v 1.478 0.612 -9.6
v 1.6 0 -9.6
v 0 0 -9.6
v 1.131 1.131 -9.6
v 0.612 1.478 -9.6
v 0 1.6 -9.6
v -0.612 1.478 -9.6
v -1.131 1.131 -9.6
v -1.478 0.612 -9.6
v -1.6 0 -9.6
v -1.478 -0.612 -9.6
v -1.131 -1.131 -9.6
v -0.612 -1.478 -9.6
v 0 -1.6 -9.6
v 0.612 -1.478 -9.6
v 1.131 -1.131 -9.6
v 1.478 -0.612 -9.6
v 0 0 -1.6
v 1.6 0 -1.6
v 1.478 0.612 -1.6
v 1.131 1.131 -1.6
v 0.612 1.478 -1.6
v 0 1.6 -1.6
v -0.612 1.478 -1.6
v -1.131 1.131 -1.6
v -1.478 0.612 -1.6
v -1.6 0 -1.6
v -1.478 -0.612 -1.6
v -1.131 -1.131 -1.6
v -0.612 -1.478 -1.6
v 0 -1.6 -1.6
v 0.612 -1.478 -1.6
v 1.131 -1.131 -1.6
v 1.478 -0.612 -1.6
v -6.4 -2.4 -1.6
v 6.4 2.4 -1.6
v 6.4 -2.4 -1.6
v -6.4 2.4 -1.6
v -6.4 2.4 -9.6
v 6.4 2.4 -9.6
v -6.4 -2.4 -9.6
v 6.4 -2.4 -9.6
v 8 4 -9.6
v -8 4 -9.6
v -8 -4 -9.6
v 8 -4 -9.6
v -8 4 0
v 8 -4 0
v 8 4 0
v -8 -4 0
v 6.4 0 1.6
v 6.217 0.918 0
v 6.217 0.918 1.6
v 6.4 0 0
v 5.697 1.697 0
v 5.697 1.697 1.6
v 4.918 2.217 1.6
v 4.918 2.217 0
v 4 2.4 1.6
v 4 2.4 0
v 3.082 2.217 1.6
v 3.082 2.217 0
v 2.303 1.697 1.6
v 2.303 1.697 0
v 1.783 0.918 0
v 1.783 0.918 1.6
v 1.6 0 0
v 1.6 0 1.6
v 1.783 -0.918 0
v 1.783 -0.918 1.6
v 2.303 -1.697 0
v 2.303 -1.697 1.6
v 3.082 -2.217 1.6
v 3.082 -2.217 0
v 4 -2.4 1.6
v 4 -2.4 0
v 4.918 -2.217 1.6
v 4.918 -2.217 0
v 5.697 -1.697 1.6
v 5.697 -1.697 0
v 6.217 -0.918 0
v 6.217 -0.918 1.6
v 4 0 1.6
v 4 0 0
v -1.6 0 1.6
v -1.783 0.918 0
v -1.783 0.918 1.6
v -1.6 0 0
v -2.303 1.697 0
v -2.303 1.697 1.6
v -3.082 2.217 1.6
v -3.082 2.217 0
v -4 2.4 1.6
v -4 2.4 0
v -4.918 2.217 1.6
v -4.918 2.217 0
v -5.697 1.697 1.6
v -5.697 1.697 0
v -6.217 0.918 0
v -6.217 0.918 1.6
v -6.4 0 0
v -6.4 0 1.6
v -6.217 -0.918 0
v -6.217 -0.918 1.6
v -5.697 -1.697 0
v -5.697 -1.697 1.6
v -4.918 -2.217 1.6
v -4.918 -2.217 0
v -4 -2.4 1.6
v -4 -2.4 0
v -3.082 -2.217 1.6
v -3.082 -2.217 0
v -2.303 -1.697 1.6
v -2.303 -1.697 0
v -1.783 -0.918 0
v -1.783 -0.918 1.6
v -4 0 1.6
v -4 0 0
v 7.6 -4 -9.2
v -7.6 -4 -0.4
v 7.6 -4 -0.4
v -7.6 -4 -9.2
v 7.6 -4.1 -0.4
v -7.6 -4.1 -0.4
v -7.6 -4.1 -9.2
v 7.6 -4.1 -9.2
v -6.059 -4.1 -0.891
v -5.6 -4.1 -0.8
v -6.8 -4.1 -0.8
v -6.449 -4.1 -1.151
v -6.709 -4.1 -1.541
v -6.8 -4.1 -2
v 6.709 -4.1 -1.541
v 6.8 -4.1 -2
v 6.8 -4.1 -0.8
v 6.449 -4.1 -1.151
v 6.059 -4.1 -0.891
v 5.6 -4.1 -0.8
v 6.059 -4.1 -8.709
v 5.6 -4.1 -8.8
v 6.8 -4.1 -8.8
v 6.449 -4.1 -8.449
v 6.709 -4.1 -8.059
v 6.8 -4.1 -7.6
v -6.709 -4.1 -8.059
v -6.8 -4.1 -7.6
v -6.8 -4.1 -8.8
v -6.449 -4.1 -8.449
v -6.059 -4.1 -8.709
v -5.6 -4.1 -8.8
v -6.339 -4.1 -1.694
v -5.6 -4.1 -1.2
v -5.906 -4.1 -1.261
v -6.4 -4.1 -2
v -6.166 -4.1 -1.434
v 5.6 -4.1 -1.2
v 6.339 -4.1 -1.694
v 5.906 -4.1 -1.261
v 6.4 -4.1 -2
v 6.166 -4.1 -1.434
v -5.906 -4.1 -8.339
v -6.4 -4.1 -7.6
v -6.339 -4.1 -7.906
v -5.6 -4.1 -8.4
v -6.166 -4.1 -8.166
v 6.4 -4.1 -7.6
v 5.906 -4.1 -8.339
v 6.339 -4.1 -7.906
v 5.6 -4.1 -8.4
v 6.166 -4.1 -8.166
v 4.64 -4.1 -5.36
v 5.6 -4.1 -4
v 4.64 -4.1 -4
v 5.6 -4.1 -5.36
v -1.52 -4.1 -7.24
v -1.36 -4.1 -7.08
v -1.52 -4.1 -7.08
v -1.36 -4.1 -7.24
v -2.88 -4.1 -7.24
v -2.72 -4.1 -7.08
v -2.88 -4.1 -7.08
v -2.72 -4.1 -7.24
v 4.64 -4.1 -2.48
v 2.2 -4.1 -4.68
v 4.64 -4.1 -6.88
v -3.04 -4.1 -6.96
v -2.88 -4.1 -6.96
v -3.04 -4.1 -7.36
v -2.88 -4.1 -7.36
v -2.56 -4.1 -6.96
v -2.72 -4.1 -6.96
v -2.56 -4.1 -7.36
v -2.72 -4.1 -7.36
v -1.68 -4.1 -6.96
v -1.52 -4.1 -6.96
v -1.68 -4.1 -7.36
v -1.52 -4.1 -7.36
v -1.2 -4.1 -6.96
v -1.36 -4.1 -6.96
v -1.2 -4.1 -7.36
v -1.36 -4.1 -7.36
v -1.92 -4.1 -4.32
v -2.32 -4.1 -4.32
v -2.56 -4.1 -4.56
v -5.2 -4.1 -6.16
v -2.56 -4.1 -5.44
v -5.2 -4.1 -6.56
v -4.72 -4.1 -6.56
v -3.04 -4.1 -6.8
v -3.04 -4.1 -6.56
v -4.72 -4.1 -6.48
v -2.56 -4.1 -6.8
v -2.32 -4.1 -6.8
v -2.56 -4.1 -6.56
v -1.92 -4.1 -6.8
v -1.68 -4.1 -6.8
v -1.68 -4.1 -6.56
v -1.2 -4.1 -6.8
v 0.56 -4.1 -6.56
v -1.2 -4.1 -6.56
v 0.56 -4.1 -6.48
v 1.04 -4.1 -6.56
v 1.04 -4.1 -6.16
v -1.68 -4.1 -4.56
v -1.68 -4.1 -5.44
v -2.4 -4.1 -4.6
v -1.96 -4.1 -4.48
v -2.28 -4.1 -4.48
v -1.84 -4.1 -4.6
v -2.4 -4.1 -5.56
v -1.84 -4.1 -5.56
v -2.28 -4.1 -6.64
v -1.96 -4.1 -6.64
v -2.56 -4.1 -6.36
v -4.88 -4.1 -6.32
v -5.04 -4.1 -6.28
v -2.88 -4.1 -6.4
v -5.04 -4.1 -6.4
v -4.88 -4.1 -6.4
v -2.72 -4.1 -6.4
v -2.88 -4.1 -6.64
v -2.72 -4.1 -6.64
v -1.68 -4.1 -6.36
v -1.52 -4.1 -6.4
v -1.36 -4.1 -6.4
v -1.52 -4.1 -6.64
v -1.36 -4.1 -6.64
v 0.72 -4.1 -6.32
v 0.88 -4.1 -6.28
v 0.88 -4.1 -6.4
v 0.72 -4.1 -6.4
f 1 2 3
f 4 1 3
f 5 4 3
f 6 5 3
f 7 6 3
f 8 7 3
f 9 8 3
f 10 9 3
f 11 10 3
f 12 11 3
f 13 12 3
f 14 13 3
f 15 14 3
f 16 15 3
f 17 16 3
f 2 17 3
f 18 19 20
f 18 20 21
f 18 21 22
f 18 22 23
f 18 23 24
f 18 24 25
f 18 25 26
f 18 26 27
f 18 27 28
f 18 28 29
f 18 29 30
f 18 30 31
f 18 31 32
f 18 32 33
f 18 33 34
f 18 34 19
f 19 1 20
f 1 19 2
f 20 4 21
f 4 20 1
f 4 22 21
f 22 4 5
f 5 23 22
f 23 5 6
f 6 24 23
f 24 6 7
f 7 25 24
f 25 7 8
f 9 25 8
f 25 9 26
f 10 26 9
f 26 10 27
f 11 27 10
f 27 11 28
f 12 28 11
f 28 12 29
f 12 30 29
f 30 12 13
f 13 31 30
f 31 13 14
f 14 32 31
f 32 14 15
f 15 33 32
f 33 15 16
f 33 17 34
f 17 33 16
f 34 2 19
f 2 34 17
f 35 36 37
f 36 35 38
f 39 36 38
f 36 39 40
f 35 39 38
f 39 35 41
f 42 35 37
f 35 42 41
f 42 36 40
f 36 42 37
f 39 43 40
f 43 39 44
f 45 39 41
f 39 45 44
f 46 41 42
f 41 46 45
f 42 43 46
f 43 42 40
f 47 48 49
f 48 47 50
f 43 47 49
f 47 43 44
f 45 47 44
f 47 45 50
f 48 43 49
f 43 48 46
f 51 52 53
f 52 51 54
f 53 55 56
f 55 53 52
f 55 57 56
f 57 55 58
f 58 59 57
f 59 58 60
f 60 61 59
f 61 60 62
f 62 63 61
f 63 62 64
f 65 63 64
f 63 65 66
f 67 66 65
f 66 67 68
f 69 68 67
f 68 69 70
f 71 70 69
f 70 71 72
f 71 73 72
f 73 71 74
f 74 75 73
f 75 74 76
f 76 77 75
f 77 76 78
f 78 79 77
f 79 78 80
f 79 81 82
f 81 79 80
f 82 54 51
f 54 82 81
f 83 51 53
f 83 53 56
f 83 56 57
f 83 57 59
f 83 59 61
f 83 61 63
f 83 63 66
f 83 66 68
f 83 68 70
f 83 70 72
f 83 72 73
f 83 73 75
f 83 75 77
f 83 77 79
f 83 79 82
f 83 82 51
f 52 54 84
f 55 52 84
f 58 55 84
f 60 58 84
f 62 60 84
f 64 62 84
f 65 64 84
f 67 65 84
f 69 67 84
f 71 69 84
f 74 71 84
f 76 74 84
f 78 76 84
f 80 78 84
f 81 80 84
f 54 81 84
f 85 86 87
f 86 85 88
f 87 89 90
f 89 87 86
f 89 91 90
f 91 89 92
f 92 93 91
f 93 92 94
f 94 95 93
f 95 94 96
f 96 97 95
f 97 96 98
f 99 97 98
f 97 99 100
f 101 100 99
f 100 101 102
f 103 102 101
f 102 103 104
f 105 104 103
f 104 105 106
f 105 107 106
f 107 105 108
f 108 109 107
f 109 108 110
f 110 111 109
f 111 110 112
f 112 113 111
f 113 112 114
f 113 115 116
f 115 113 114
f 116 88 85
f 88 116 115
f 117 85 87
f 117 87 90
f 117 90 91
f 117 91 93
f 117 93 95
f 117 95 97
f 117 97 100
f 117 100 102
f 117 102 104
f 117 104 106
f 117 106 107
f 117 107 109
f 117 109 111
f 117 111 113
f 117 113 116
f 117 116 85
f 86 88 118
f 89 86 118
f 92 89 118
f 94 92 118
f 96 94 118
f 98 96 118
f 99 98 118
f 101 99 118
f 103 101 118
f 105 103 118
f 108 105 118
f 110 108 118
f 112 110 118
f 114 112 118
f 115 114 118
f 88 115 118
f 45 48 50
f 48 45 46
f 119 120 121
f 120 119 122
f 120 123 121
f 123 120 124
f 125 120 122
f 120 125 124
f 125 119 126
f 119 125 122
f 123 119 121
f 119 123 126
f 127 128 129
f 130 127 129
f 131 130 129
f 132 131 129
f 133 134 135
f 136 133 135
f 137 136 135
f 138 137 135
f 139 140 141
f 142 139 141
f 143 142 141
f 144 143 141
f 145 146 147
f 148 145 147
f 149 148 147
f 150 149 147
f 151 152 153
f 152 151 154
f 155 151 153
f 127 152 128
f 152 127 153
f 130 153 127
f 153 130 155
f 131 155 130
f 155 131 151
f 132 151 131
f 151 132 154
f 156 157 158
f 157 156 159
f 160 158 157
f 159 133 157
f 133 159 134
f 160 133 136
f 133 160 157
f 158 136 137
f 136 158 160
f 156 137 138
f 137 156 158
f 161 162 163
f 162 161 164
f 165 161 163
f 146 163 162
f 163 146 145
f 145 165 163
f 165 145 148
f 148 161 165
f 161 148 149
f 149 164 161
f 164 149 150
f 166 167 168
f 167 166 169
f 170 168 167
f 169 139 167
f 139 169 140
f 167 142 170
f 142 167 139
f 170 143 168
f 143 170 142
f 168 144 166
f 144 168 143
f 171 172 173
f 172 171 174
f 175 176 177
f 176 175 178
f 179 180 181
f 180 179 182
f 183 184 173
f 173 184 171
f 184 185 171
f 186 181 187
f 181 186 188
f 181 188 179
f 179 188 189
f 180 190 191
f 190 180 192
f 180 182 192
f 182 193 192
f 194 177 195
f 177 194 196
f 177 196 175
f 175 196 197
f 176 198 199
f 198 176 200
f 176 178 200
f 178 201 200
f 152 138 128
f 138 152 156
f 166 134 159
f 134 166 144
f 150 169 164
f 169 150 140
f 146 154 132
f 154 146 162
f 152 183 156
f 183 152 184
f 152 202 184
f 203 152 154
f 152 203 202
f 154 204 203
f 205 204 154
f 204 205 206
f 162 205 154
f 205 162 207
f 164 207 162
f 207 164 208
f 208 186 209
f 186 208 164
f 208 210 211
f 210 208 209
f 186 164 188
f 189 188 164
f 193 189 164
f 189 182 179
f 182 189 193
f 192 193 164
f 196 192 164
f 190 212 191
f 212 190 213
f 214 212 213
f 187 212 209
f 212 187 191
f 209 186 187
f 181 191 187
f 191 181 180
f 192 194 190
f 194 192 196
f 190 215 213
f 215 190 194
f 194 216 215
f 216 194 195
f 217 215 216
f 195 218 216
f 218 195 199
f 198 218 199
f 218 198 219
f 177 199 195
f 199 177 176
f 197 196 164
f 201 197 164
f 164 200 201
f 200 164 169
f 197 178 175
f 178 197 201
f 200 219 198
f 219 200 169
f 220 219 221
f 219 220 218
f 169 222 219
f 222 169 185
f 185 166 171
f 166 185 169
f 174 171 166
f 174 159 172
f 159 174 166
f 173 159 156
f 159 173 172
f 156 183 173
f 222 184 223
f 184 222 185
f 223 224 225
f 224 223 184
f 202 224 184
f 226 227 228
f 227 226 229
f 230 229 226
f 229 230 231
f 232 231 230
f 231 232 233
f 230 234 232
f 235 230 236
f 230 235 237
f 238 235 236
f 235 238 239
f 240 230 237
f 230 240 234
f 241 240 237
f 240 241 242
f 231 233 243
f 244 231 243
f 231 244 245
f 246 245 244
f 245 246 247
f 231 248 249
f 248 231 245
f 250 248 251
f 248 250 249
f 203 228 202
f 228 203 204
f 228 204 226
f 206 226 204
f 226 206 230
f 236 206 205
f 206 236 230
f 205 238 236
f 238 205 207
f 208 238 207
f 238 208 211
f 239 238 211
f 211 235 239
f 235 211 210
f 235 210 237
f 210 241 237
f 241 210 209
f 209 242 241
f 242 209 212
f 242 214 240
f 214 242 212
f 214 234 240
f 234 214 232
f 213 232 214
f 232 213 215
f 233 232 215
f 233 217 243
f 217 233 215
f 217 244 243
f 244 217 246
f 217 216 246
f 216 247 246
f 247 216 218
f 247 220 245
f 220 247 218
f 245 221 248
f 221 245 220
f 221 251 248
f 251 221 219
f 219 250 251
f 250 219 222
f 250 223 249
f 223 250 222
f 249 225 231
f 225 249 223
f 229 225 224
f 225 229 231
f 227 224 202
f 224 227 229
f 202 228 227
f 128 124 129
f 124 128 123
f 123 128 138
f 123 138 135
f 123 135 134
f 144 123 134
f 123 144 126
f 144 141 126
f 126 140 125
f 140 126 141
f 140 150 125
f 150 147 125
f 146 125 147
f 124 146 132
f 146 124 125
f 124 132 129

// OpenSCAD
// file: ../p/4-4edge.scad
use <../lib.scad>
function ldraw_lib__4_4edge() = [
// 0 Circle 1.0
// 0 Name: 4-4edge.dat
// 0 Author: James Jessiman
// 0 !LDRAW_ORG Primitive UPDATE 2017-01
// 0 !LICENSE Licensed under CC BY 2.0 and CC BY 4.0 : see CAreadme.txt
// 
// 0 BFC CERTIFY CCW
  [0,"BFC","CERTIFY"],
  [0,"BFC","CCW"],
// 
// 0 !HISTORY 1998-12-15 [PTadmin] Official Update 1998-10
// 0 !HISTORY 2005-12-28 [PTadmin] Official Update 2005-01
// 0 !HISTORY 2007-06-24 [PTadmin] Header formatted for Contributor Agreement
// 0 !HISTORY 2008-07-01 [PTadmin] Official Update 2008-01
// 0 !HISTORY 2017-01-15 [Steffen] BFCed
// 0 !HISTORY 2017-12-30 [PTadmin] Official Update 2017-01
// 
// 
// 2 24 1 0 0 0.9239 0 0.3827
  [2,24,1,0,0,0.9239,0,0.3827],
// 2 24 0.9239 0 0.3827 0.7071 0 0.7071
  [2,24,0.9239,0,0.3827,0.7071,0,0.7071],
// 2 24 0.7071 0 0.7071 0.3827 0 0.9239
  [2,24,0.7071,0,0.7071,0.3827,0,0.9239],
// 2 24 0.3827 0 0.9239 0 0 1
  [2,24,0.3827,0,0.9239,0,0,1],
// 2 24 0 0 1 -0.3827 0 0.9239
  [2,24,0,0,1,-0.3827,0,0.9239],
// 2 24 -0.3827 0 0.9239 -0.7071 0 0.7071
  [2,24,-0.3827,0,0.9239,-0.7071,0,0.7071],
// 2 24 -0.7071 0 0.7071 -0.9239 0 0.3827
  [2,24,-0.7071,0,0.7071,-0.9239,0,0.3827],
// 2 24 -0.9239 0 0.3827 -1 0 -0
  [2,24,-0.9239,0,0.3827,-1,0,-0],
// 2 24 -1 0 -0 -0.9239 0 -0.3827
  [2,24,-1,0,-0,-0.9239,0,-0.3827],
// 2 24 -0.9239 0 -0.3827 -0.7071 0 -0.7071
  [2,24,-0.9239,0,-0.3827,-0.7071,0,-0.7071],
// 2 24 -0.7071 0 -0.7071 -0.3827 0 -0.9239
  [2,24,-0.7071,0,-0.7071,-0.3827,0,-0.9239],
// 2 24 -0.3827 0 -0.9239 0 0 -1
  [2,24,-0.3827,0,-0.9239,0,0,-1],
// 2 24 0 0 -1 0.3827 0 -0.9239
  [2,24,0,0,-1,0.3827,0,-0.9239],
// 2 24 0.3827 0 -0.9239 0.7071 0 -0.7071
  [2,24,0.3827,0,-0.9239,0.7071,0,-0.7071],
// 2 24 0.7071 0 -0.7071 0.9239 0 -0.3827
  [2,24,0.7071,0,-0.7071,0.9239,0,-0.3827],
// 2 24 0.9239 0 -0.3827 1 0 0
  [2,24,0.9239,0,-0.3827,1,0,0],
];
module ldraw_lib__4_4edge(step=0, col=false, unit=2/5, alt=false, line=0.2, solid=!$preview)
    makepoly(ldraw_lib__4_4edge(), step=step, col=col, unit=unit, alt=alt, line=line, solid=solid);
ldraw_lib__4_4edge(line=0.2);
// file: ../p/4-4disc.scad
use <../lib.scad>
function ldraw_lib__4_4disc() = [
// 0 Disc 1.0
// 0 Name: 4-4disc.dat
// 0 Author: James Jessiman
// 0 !LDRAW_ORG Primitive UPDATE 2002-02
// 0 !LICENSE Licensed under CC BY 2.0 and CC BY 4.0 : see CAreadme.txt
// 
// 0 BFC CERTIFY CCW
  [0,"BFC","CERTIFY"],
  [0,"BFC","CCW"],
// 
// 0 !HISTORY 1998-12-15 [PTadmin] Official Update 1998-10
// 0 !HISTORY 2002-03-23 [sbliss] Added BFC statement
// 0 !HISTORY 2002-04-25 [PTadmin] Official Update 2002-02
// 0 !HISTORY 2007-06-24 [PTadmin] Header formatted for Contributor Agreement
// 0 !HISTORY 2008-07-01 [PTadmin] Official Update 2008-01
// 
// 
// 3 16 0 0 0 1 0 0 0.9239 0 0.3827
  [3,16,0,0,0,1,0,0,0.9239,0,0.3827],
// 3 16 0 0 0 0.9239 0 0.3827 0.7071 0 0.7071
  [3,16,0,0,0,0.9239,0,0.3827,0.7071,0,0.7071],
// 3 16 0 0 0 0.7071 0 0.7071 0.3827 0 0.9239
  [3,16,0,0,0,0.7071,0,0.7071,0.3827,0,0.9239],
// 3 16 0 0 0 0.3827 0 0.9239 0 0 1
  [3,16,0,0,0,0.3827,0,0.9239,0,0,1],
// 3 16 0 0 0 0 0 1 -0.3827 0 0.9239
  [3,16,0,0,0,0,0,1,-0.3827,0,0.9239],
// 3 16 0 0 0 -0.3827 0 0.9239 -0.7071 0 0.7071
  [3,16,0,0,0,-0.3827,0,0.9239,-0.7071,0,0.7071],
// 3 16 0 0 0 -0.7071 0 0.7071 -0.9239 0 0.3827
  [3,16,0,0,0,-0.7071,0,0.7071,-0.9239,0,0.3827],
// 3 16 0 0 0 -0.9239 0 0.3827 -1 0 -0
  [3,16,0,0,0,-0.9239,0,0.3827,-1,0,-0],
// 3 16 0 0 0 -1 0 -0 -0.9239 0 -0.3827
  [3,16,0,0,0,-1,0,-0,-0.9239,0,-0.3827],
// 3 16 0 0 0 -0.9239 0 -0.3827 -0.7071 0 -0.7071
  [3,16,0,0,0,-0.9239,0,-0.3827,-0.7071,0,-0.7071],
// 3 16 0 0 0 -0.7071 0 -0.7071 -0.3827 0 -0.9239
  [3,16,0,0,0,-0.7071,0,-0.7071,-0.3827,0,-0.9239],
// 3 16 0 0 0 -0.3827 0 -0.9239 0 0 -1
  [3,16,0,0,0,-0.3827,0,-0.9239,0,0,-1],
// 3 16 0 0 0 0 0 -1 0.3827 0 -0.9239
  [3,16,0,0,0,0,0,-1,0.3827,0,-0.9239],
// 3 16 0 0 0 0.3827 0 -0.9239 0.7071 0 -0.7071
  [3,16,0,0,0,0.3827,0,-0.9239,0.7071,0,-0.7071],
// 3 16 0 0 0 0.7071 0 -0.7071 0.9239 0 -0.3827
  [3,16,0,0,0,0.7071,0,-0.7071,0.9239,0,-0.3827],
// 3 16 0 0 0 0.9239 0 -0.3827 1 0 0
  [3,16,0,0,0,0.9239,0,-0.3827,1,0,0],
// 0
];
module ldraw_lib__4_4disc(step=0, col=false, unit=2/5, alt=false, line=0.2, solid=!$preview)
    makepoly(ldraw_lib__4_4disc(), step=step, col=col, unit=unit, alt=alt, line=line, solid=solid);
ldraw_lib__4_4disc(line=0.2);
// file: ../p/4-4cyli.scad
use <../lib.scad>
$fa=1; $fs=0.2;
function ldraw_lib__4_4cyli(realsolid=false) = [
// 0 Cylinder 1.0
// 0 Name: 4-4cyli.dat
// 0 Author: James Jessiman
// 0 !LDRAW_ORG Primitive UPDATE 2005-01
// 0 !LICENSE Licensed under CC BY 2.0 and CC BY 4.0 : see CAreadme.txt
// 
// 0 BFC CERTIFY CCW
  [0,"BFC","CERTIFY"],
  [0,"BFC","CCW"],
// 
// 0 !HISTORY 1998-12-15 [PTadmin] Official Update 1998-10
// 0 !HISTORY 2002-03-23 [sbliss] Added BFC statement; merged headers from files in distributions LDraw 0.27 and Complete.
// 0 !HISTORY 2002-04-25 [PTadmin] Official Update 2002-02
// 0 !HISTORY 2004-12-14 [guyvivan] BFC CCW
// 0 !HISTORY 2005-12-28 [PTadmin] Official Update 2005-01
// 0 !HISTORY 2007-06-24 [PTadmin] Header formatted for Contributor Agreement
// 0 !HISTORY 2008-07-01 [PTadmin] Official Update 2008-01
// 
// 
// 4 16 1 1 0 0.9239 1 0.3827 0.9239 0 0.3827 1 0 0
  [4,16,1,1,0,0.9239,1,0.3827,0.9239,0,0.3827,1,0,0],
// 5 24 1 0 0 1 1 0 0.9239 0 0.3827 0.9239 0 -0.3827
  [5,24,1,0,0,1,1,0,0.9239,0,0.3827,0.9239,0,-0.3827],
// 4 16 0.9239 1 0.3827 0.7071 1 0.7071 0.7071 0 0.7071 0.9239 0 0.3827
  [4,16,0.9239,1,0.3827,0.7071,1,0.7071,0.7071,0,0.7071,0.9239,0,0.3827],
// 5 24 0.9239 0 0.3827 0.9239 1 0.3827 0.7071 0 0.7071 1 0 0
  [5,24,0.9239,0,0.3827,0.9239,1,0.3827,0.7071,0,0.7071,1,0,0],
// 4 16 0.7071 1 0.7071 0.3827 1 0.9239 0.3827 0 0.9239 0.7071 0 0.7071
  [4,16,0.7071,1,0.7071,0.3827,1,0.9239,0.3827,0,0.9239,0.7071,0,0.7071],
// 5 24 0.7071 0 0.7071 0.7071 1 0.7071 0.3827 0 0.9239 0.9239 0 0.3827
  [5,24,0.7071,0,0.7071,0.7071,1,0.7071,0.3827,0,0.9239,0.9239,0,0.3827],
// 4 16 0.3827 1 0.9239 0 1 1 0 0 1 0.3827 0 0.9239
  [4,16,0.3827,1,0.9239,0,1,1,0,0,1,0.3827,0,0.9239],
// 5 24 0.3827 0 0.9239 0.3827 1 0.9239 0 0 1 0.7071 0 0.7071
  [5,24,0.3827,0,0.9239,0.3827,1,0.9239,0,0,1,0.7071,0,0.7071],
// 4 16 0 1 1 -0.3827 1 0.9239 -0.3827 0 0.9239 0 0 1
  [4,16,0,1,1,-0.3827,1,0.9239,-0.3827,0,0.9239,0,0,1],
// 5 24 0 0 1 0 1 1 -0.3827 0 0.9239 0.3827 0 0.9239
  [5,24,0,0,1,0,1,1,-0.3827,0,0.9239,0.3827,0,0.9239],
// 4 16 -0.3827 1 0.9239 -0.7071 1 0.7071 -0.7071 0 0.7071 -0.3827 0 0.9239
  [4,16,-0.3827,1,0.9239,-0.7071,1,0.7071,-0.7071,0,0.7071,-0.3827,0,0.9239],
// 5 24 -0.3827 0 0.9239 -0.3827 1 0.9239 -0.7071 0 0.7071 0 0 1
  [5,24,-0.3827,0,0.9239,-0.3827,1,0.9239,-0.7071,0,0.7071,0,0,1],
// 4 16 -0.7071 1 0.7071 -0.9239 1 0.3827 -0.9239 0 0.3827 -0.7071 0 0.7071
  [4,16,-0.7071,1,0.7071,-0.9239,1,0.3827,-0.9239,0,0.3827,-0.7071,0,0.7071],
// 5 24 -0.7071 0 0.7071 -0.7071 1 0.7071 -0.9239 0 0.3827 -0.3827 0 0.9239
  [5,24,-0.7071,0,0.7071,-0.7071,1,0.7071,-0.9239,0,0.3827,-0.3827,0,0.9239],
// 4 16 -0.9239 1 0.3827 -1 1 0 -1 0 0 -0.9239 0 0.3827
  [4,16,-0.9239,1,0.3827,-1,1,0,-1,0,0,-0.9239,0,0.3827],
// 5 24 -0.9239 0 0.3827 -0.9239 1 0.3827 -1 0 0 -0.7071 0 0.7071
  [5,24,-0.9239,0,0.3827,-0.9239,1,0.3827,-1,0,0,-0.7071,0,0.7071],
// 4 16 -1 1 0 -0.9239 1 -0.3827 -0.9239 0 -0.3827 -1 0 0
  [4,16,-1,1,0,-0.9239,1,-0.3827,-0.9239,0,-0.3827,-1,0,0],
// 5 24 -1 0 0 -1 1 0 -0.9239 0 -0.3827 -0.9239 0 0.3827
  [5,24,-1,0,0,-1,1,0,-0.9239,0,-0.3827,-0.9239,0,0.3827],
// 4 16 -0.9239 1 -0.3827 -0.7071 1 -0.7071 -0.7071 0 -0.7071 -0.9239 0 -0.3827
  [4,16,-0.9239,1,-0.3827,-0.7071,1,-0.7071,-0.7071,0,-0.7071,-0.9239,0,-0.3827],
// 5 24 -0.9239 0 -0.3827 -0.9239 1 -0.3827 -0.7071 0 -0.7071 -1 0 0
  [5,24,-0.9239,0,-0.3827,-0.9239,1,-0.3827,-0.7071,0,-0.7071,-1,0,0],
// 4 16 -0.7071 1 -0.7071 -0.3827 1 -0.9239 -0.3827 0 -0.9239 -0.7071 0 -0.7071
  [4,16,-0.7071,1,-0.7071,-0.3827,1,-0.9239,-0.3827,0,-0.9239,-0.7071,0,-0.7071],
// 5 24 -0.7071 0 -0.7071 -0.7071 1 -0.7071 -0.3827 0 -0.9239 -0.9239 0 -0.3827
  [5,24,-0.7071,0,-0.7071,-0.7071,1,-0.7071,-0.3827,0,-0.9239,-0.9239,0,-0.3827],
// 4 16 -0.3827 1 -0.9239 0 1 -1 0 0 -1 -0.3827 0 -0.9239
  [4,16,-0.3827,1,-0.9239,0,1,-1,0,0,-1,-0.3827,0,-0.9239],
// 5 24 -0.3827 0 -0.9239 -0.3827 1 -0.9239 0 0 -1 -0.7071 0 -0.7071
  [5,24,-0.3827,0,-0.9239,-0.3827,1,-0.9239,0,0,-1,-0.7071,0,-0.7071],
// 4 16 0 1 -1 0.3827 1 -0.9239 0.3827 0 -0.9239 0 0 -1
  [4,16,0,1,-1,0.3827,1,-0.9239,0.3827,0,-0.9239,0,0,-1],
// 5 24 0 0 -1 0 1 -1 0.3827 0 -0.9239 -0.3827 0 -0.9239
  [5,24,0,0,-1,0,1,-1,0.3827,0,-0.9239,-0.3827,0,-0.9239],
// 4 16 0.3827 1 -0.9239 0.7071 1 -0.7071 0.7071 0 -0.7071 0.3827 0 -0.9239
  [4,16,0.3827,1,-0.9239,0.7071,1,-0.7071,0.7071,0,-0.7071,0.3827,0,-0.9239],
// 5 24 0.3827 0 -0.9239 0.3827 1 -0.9239 0.7071 0 -0.7071 0 0 -1
  [5,24,0.3827,0,-0.9239,0.3827,1,-0.9239,0.7071,0,-0.7071,0,0,-1],
// 4 16 0.7071 1 -0.7071 0.9239 1 -0.3827 0.9239 0 -0.3827 0.7071 0 -0.7071
  [4,16,0.7071,1,-0.7071,0.9239,1,-0.3827,0.9239,0,-0.3827,0.7071,0,-0.7071],
// 5 24 0.7071 0 -0.7071 0.7071 1 -0.7071 0.9239 0 -0.3827 0.3827 0 -0.9239
  [5,24,0.7071,0,-0.7071,0.7071,1,-0.7071,0.9239,0,-0.3827,0.3827,0,-0.9239],
// 4 16 0.9239 1 -0.3827 1 1 0 1 0 0 0.9239 0 -0.3827
  [4,16,0.9239,1,-0.3827,1,1,0,1,0,0,0.9239,0,-0.3827],
// 5 24 0.9239 0 -0.3827 0.9239 1 -0.3827 1 0 0 0.7071 0 -0.7071
  [5,24,0.9239,0,-0.3827,0.9239,1,-0.3827,1,0,0,0.7071,0,-0.7071],
// 0
];
module ldraw_lib__4_4cyli(step=0, col=false, unit=2/5, alt=false, line=0.2, solid=!$preview)
    makepoly(ldraw_lib__4_4cyli(solid), step=step, col=col, unit=unit, alt=alt, line=line, solid=solid);
ldraw_lib__4_4cyli(line=0.2);
// file: ../p/stud3.scad
use <../lib.scad>
use <4-4cyli.scad>
use <4-4disc.scad>
use <4-4edge.scad>
function ldraw_lib__stud3() = [
// 0 Stud Tube Solid
// 0 Name: stud3.dat
// 0 Author: James Jessiman
// 0 !LDRAW_ORG Primitive UPDATE 2012-01
// 0 !LICENSE Licensed under CC BY 4.0 : see CAreadme.txt
// 
// 0 BFC CERTIFY CCW
  [0,"BFC","CERTIFY"],
  [0,"BFC","CCW"],
// 
// 0 !HISTORY 2002-04-04 [sbliss] Modified for BFC compliance
// 0 !HISTORY 2002-04-25 [PTadmin] Official Update 2002-02
// 0 !HISTORY 2007-06-24 [PTadmin] Header formatted for Contributor Agreement
// 0 !HISTORY 2008-07-01 [PTadmin] Official Update 2008-01
// 0 !HISTORY 2012-02-16 [Philo] Changed to CCW
// 0 !HISTORY 2012-03-30 [PTadmin] Official Update 2012-01
// 
// 
// 1 16 0 -4 0 4 0 0 0 1 0 0 0 4 4-4edge.dat
  [1,16,0,-4,0,4,0,0,0,1,0,0,0,4, ldraw_lib__4_4edge()],
// 1 16 0 0 0 4 0 0 0 1 0 0 0 4 4-4edge.dat
  [1,16,0,0,0,4,0,0,0,1,0,0,0,4, ldraw_lib__4_4edge()],
// 1 16 0 -4 0 4 0 0 0 1 0 0 0 4 4-4disc.dat
  [1,16,0,-4,0,4,0,0,0,1,0,0,0,4, ldraw_lib__4_4disc()],
  [-1,16,0,0,0,4,0,0,0,-1,0,0,0,4, ldraw_lib__4_4disc()],
// 1 16 0 -4 0 4 0 0 0 4 0 0 0 4 4-4cyli.dat
  [1,16,0,-4,0,4,0,0,0,4,0,0,0,4, ldraw_lib__4_4cyli()],
];
module ldraw_lib__stud3(step=0, col=false, unit=2/5, alt=false, line=0.2, solid=!$preview)
    makepoly(ldraw_lib__stud3(), step=step, col=col, unit=unit, alt=alt, line=line, solid=solid);
ldraw_lib__stud3(line=0.2);
// file: ../p/stud.scad
use <../lib.scad>
use <4-4cyli.scad>
use <4-4disc.scad>
use <4-4edge.scad>
function ldraw_lib__stud() = [
// 0 Stud
// 0 Name: stud.dat
// 0 Author: James Jessiman
// 0 !LDRAW_ORG Primitive UPDATE 2012-01
// 0 !LICENSE Licensed under CC BY 4.0 : see CAreadme.txt
// 
// 0 BFC CERTIFY CCW
  [0,"BFC","CERTIFY"],
  [0,"BFC","CCW"],
// 
// 0 !HISTORY 2002-04-04 [sbliss] Modified for BFC compliance
// 0 !HISTORY 2002-04-25 [PTadmin] Official Update 2002-02
// 0 !HISTORY 2007-06-24 [PTadmin] Header formatted for Contributor Agreement
// 0 !HISTORY 2008-07-01 [PTadmin] Official Update 2008-01
// 0 !HISTORY 2012-02-16 [Philo] Changed to CCW
// 0 !HISTORY 2012-03-30 [PTadmin] Official Update 2012-01
// 
// 
// 1 16 0 0 0 6 0 0 0 1 0 0 0 6 4-4edge.dat
  [1,16,0,0,0,6,0,0,0,1,0,0,0,6, ldraw_lib__4_4edge()],
// 1 16 0 -4 0 6 0 0 0 1 0 0 0 6 4-4edge.dat
  [1,16,0,-4,0,6,0,0,0,1,0,0,0,6, ldraw_lib__4_4edge()],
// 1 16 0 0 0 6 0 0 0 -4 0 0 0 6 4-4cyli.dat
  [1,16,0,0,0,6,0,0,0,-4,0,0,0,6, ldraw_lib__4_4cyli()],
// 1 16 0 -4 0 6 0 0 0 1 0 0 0 6 4-4disc.dat
  [1,16,0,-4,0,6,0,0,0,1,0,0,0,6, ldraw_lib__4_4disc()],
  [-1,16,0,0,0,6,0,0,0,-1,0,0,0,6, ldraw_lib__4_4disc()],
];
module ldraw_lib__stud(step=0, col=false, unit=2/5, alt=false, line=0.2, solid=!$preview)
    makepoly(ldraw_lib__stud(), step=step, col=col, unit=unit, alt=alt, line=line, solid=solid);
ldraw_lib__stud(line=0.2);
// file: ../p/box5.scad
use <../lib.scad>
function ldraw_lib__box5() = [
// 0 Box with 5 Faces and All Edges
// 0 Name: box5.dat
// 0 Author: James Jessiman
// 0 !LDRAW_ORG Primitive UPDATE 2012-01
// 0 !LICENSE Licensed under CC BY 2.0 and CC BY 4.0 : see CAreadme.txt
// 
// 0 BFC CERTIFY CCW
  [0,"BFC","CERTIFY"],
  [0,"BFC","CCW"],
// 
// 0 !HISTORY 2002-04-03 [sbliss] Modified for BFC compliance
// 0 !HISTORY 2002-04-25 [PTadmin] Official Update 2002-02
// 0 !HISTORY 2007-06-24 [PTadmin] Header formatted for Contributor Agreement
// 0 !HISTORY 2008-07-01 [PTadmin] Official Update 2008-01
// 0 !HISTORY 2012-02-16 [Philo] Changed to CCW
// 0 !HISTORY 2012-03-30 [PTadmin] Official Update 2012-01
// 
// 
// 2 24 1 1 1 -1 1 1
  [2,24,1,1,1,-1,1,1],
// 2 24 -1 1 1 -1 1 -1
  [2,24,-1,1,1,-1,1,-1],
// 2 24 -1 1 -1 1 1 -1
  [2,24,-1,1,-1,1,1,-1],
// 2 24 1 1 -1 1 1 1
  [2,24,1,1,-1,1,1,1],
// 2 24 1 0 1 -1 0 1
  [2,24,1,0,1,-1,0,1],
// 2 24 -1 0 1 -1 0 -1
  [2,24,-1,0,1,-1,0,-1],
// 2 24 -1 0 -1 1 0 -1
  [2,24,-1,0,-1,1,0,-1],
// 2 24 1 0 -1 1 0 1
  [2,24,1,0,-1,1,0,1],
// 2 24 1 0 1 1 1 1
  [2,24,1,0,1,1,1,1],
// 2 24 -1 0 1 -1 1 1
  [2,24,-1,0,1,-1,1,1],
// 2 24 1 0 -1 1 1 -1
  [2,24,1,0,-1,1,1,-1],
// 2 24 -1 0 -1 -1 1 -1
  [2,24,-1,0,-1,-1,1,-1],
// 4 16 -1 1 1 1 1 1 1 1 -1 -1 1 -1
  [4,16,-1,1,1,1,1,1,1,1,-1,-1,1,-1],
// 4 16 -1 1 1 -1 0 1 1 0 1 1 1 1
  [4,16,-1,1,1,-1,0,1,1,0,1,1,1,1],
// 4 16 -1 1 -1 -1 0 -1 -1 0 1 -1 1 1
  [4,16,-1,1,-1,-1,0,-1,-1,0,1,-1,1,1],
// 4 16 1 1 -1 1 0 -1 -1 0 -1 -1 1 -1
  [4,16,1,1,-1,1,0,-1,-1,0,-1,-1,1,-1],
// 4 16 1 1 1 1 0 1 1 0 -1 1 1 -1
  [4,16,1,1,1,1,0,1,1,0,-1,1,1,-1],
];
makepoly(ldraw_lib__box5(), line=0.2);
// file: ../p/box4t.scad
use <../lib.scad>
function ldraw_lib__box4t() = [
// 0 Box with 4 Adjacent Faces and All Edges
// 0 Name: box4t.dat
// 0 Author: Tore Eriksson [Tore_Eriksson]
// 0 !LDRAW_ORG Primitive UPDATE 2003-02
// 0 !LICENSE Licensed under CC BY 2.0 and CC BY 4.0 : see CAreadme.txt
// 
// 0 BFC CERTIFY CCW
  [0,"BFC","CERTIFY"],
  [0,"BFC","CCW"],
// 
// 0 !HISTORY 1997-09-29 [PTadmin] Official Update 1997-15
// 0 !HISTORY 2002-08-31 [izanette] Modified with WINDZ for BFC compliance
// 0 !HISTORY 2003-08-01 [PTadmin] Official Update 2003-02
// 0 !HISTORY 2007-06-24 [PTadmin] Header formatted for Contributor Agreement
// 0 !HISTORY 2008-07-01 [PTadmin] Official Update 2008-01
// 
// 
// 2 24 1 1 1 -1 1 1
  [2,24,1,1,1,-1,1,1],
// 2 24 -1 1 1 -1 1 -1
  [2,24,-1,1,1,-1,1,-1],
// 2 24 -1 1 -1 1 1 -1
  [2,24,-1,1,-1,1,1,-1],
// 2 24 1 1 -1 1 1 1
  [2,24,1,1,-1,1,1,1],
// 2 24 1 0 1 -1 0 1
  [2,24,1,0,1,-1,0,1],
// 2 24 -1 0 1 -1 0 -1
  [2,24,-1,0,1,-1,0,-1],
// 2 24 -1 0 -1 1 0 -1
  [2,24,-1,0,-1,1,0,-1],
// 2 24 1 0 -1 1 0 1
  [2,24,1,0,-1,1,0,1],
// 2 24 1 0 1 1 1 1
  [2,24,1,0,1,1,1,1],
// 2 24 -1 0 1 -1 1 1
  [2,24,-1,0,1,-1,1,1],
// 2 24 1 0 -1 1 1 -1
  [2,24,1,0,-1,1,1,-1],
// 2 24 -1 0 -1 -1 1 -1
  [2,24,-1,0,-1,-1,1,-1],
// 4 16 1 1 1 1 1 -1 -1 1 -1 -1 1 1
  [4,16,1,1,1,1,1,-1,-1,1,-1,-1,1,1],
// 4 16 1 1 1 -1 1 1 -1 0 1 1 0 1
  [4,16,1,1,1,-1,1,1,-1,0,1,1,0,1],
// 4 16 -1 1 1 -1 1 -1 -1 0 -1 -1 0 1
  [4,16,-1,1,1,-1,1,-1,-1,0,-1,-1,0,1],
// 0 4 16 -1 1 -1 -1 0 -1 1 0 -1 1 1 -1
// 4 16 1 1 -1 1 1 1 1 0 1 1 0 -1
  [4,16,1,1,-1,1,1,1,1,0,1,1,0,-1],
// 0
];
makepoly(ldraw_lib__box4t(), line=0.2);
// file: s/3004s01.scad
use <../../lib.scad>
use <../../p/box4t.scad>
use <../../p/box5.scad>
use <../../p/stud.scad>
use <../../p/stud3.scad>
$fa=1; $fs=0.2;
function ldraw_lib__s__3004s01(realsolid=false) = [
// 0 ~Brick  1 x  2 without Front Face
// 0 Name: s\3004s01.dat
// 0 Author: James Jessiman
// 0 !LDRAW_ORG Subpart UPDATE 2003-03
// 0 !LICENSE Licensed under CC BY 2.0 and CC BY 4.0 : see CAreadme.txt
// 
// 0 BFC CERTIFY CCW
  [0,"BFC","CERTIFY"],
  [0,"BFC","CCW"],
// 
// 0 !HISTORY 2003-09-07 [jriley] Subfiling, BFC
// 0 !HISTORY 2003-12-19 [PTadmin] Official Update 2003-03
// 0 !HISTORY 2007-08-29 [PTadmin] Header formatted for Contributor Agreement
// 0 !HISTORY 2008-07-01 [PTadmin] Official Update 2008-01
// 
// 
// 1 16 0 4 0 1 0 0 0 -5 0 0 0 1 stud3.dat
  [1,16,0,4,0,1,0,0,0,-5,0,0,0,1, ldraw_lib__stud3(realsolid)],
// 0 BFC INVERTNEXT
  [0,"BFC","INVERTNEXT"],
// 1 16 0 24 0 16 0 0 0 -20 0 0 0 6 box5.dat
  [1,16,0,24,0,16,0,0,0,-20,0,0,0,6, ldraw_lib__box5(realsolid)],
// 4 16 20 24 10 16 24 6 -16 24 6 -20 24 10
  [4,16,20,24,10,16,24,6,-16,24,6,-20,24,10],
// 4 16 -20 24 10 -16 24 6 -16 24 -6 -20 24 -10
  [4,16,-20,24,10,-16,24,6,-16,24,-6,-20,24,-10],
// 4 16 -20 24 -10 -16 24 -6 16 24 -6 20 24 -10
  [4,16,-20,24,-10,-16,24,-6,16,24,-6,20,24,-10],
// 4 16 20 24 -10 16 24 -6 16 24 6 20 24 10
  [4,16,20,24,-10,16,24,-6,16,24,6,20,24,10],
// 1 16 0 24 0 20 0 0 0 -24 0 0 0 10 box4t.dat
  [1,16,0,24,0,20,0,0,0,-24,0,0,0,10, ldraw_lib__box4t(realsolid)],
// 1 16 10 0 0 1 0 0 0 1 0 0 0 1 stud.dat
  [1,16,10,0,0,1,0,0,0,1,0,0,0,1, ldraw_lib__stud(realsolid)],
// 1 16 -10 0 0 1 0 0 0 1 0 0 0 1 stud.dat
  [1,16,-10,0,0,1,0,0,0,1,0,0,0,1, ldraw_lib__stud(realsolid)],
// 0
];
module ldraw_lib__s__3004s01(step=0, col=false, unit=2/5, alt=false, line=0.2, solid=!$preview)
    makepoly(ldraw_lib__s__3004s01(solid), step=step, col=col, unit=unit, alt=alt, line=line, solid=solid);
ldraw_lib__s__3004s01(line=0.2);
// file: ../p/box5-12.scad
use <../lib.scad>
function ldraw_lib__box5_12() = [
// 0 Box with 5 Faces without Any Edges
// 0 Name: box5-12.dat
// 0 Author: Chris Dee [cwdee]
// 0 !LDRAW_ORG Primitive UPDATE 2009-02
// 0 !LICENSE Licensed under CC BY 2.0 and CC BY 4.0 : see CAreadme.txt
// 
// 0 BFC CERTIFY CCW
  [0,"BFC","CERTIFY"],
  [0,"BFC","CCW"],
// 
// 0 !HISTORY 2009-09-03 [PTadmin] Official Update 2009-02
// 
// 
// 4 16 1 1 1 1 1 -1 -1 1 -1 -1 1 1
  [4,16,1,1,1,1,1,-1,-1,1,-1,-1,1,1],
// 4 16 -1 0 1 1 0 1 1 1 1 -1 1 1
  [4,16,-1,0,1,1,0,1,1,1,1,-1,1,1],
// 4 16 -1 0 -1 -1 0 1 -1 1 1 -1 1 -1
  [4,16,-1,0,-1,-1,0,1,-1,1,1,-1,1,-1],
// 4 16 1 0 -1 -1 0 -1 -1 1 -1 1 1 -1
  [4,16,1,0,-1,-1,0,-1,-1,1,-1,1,1,-1],
// 4 16 1 0 1 1 0 -1 1 1 -1 1 1 1
  [4,16,1,0,1,1,0,-1,1,1,-1,1,1,1],
// 0
];
module ldraw_lib__box5_12(step=0, col=false, unit=2/5, alt=false, line=0.2, solid=!$preview)
    makepoly(ldraw_lib__box5_12(), step=step, col=col, unit=unit, alt=alt, line=line, solid=solid);
ldraw_lib__box5_12(line=0.2);
// file: ../p/1-4ring2.scad
use <../lib.scad>
$fa=1; $fs=0.2;
function ldraw_lib__1_4ring2(realsolid=false) = [
// 0 Ring  2 x 0.25
// 0 Name: 1-4ring2.dat
// 0 Author: Franklin W. Cain [fwcain]
// 0 !LDRAW_ORG Primitive UPDATE 2015-01
// 0 !LICENSE Licensed under CC BY 2.0 and CC BY 4.0 : see CAreadme.txt
// 
// 0 BFC CERTIFY CCW
  [0,"BFC","CERTIFY"],
  [0,"BFC","CCW"],
// 
// 0 !HISTORY 2001-12-31 [PTadmin] Official Update 2001-03
// 0 !HISTORY 2007-06-22 [PTadmin] Header formatted for Contributor Agreement
// 0 !HISTORY 2008-07-01 [PTadmin] Official Update 2008-01
// 0 !HISTORY 2012-02-16 [Philo] Changed to CCW
// 0 !HISTORY 2012-03-30 [PTadmin] Official Update 2012-01
// 0 !HISTORY 2014-12-25 [MMR1988] Fixed a rounding issue
// 0 !HISTORY 2015-10-11 [PTadmin] Official Update 2015-01
// 
// 
// 4 16 3 0 0 2.7717 0 1.1481 1.8478 0 0.7654 2 0 0
  [4,16,3,0,0,2.7717,0,1.1481,1.8478,0,0.7654,2,0,0],
// 4 16 2.7717 0 1.1481 2.1213 0 2.1213 1.4142 0 1.4142 1.8478 0 0.7654
  [4,16,2.7717,0,1.1481,2.1213,0,2.1213,1.4142,0,1.4142,1.8478,0,0.7654],
// 4 16 2.1213 0 2.1213 1.1481 0 2.7717 0.7654 0 1.8478 1.4142 0 1.4142
  [4,16,2.1213,0,2.1213,1.1481,0,2.7717,0.7654,0,1.8478,1.4142,0,1.4142],
// 4 16 1.1481 0 2.7717 0 0 3 0 0 2 0.7654 0 1.8478
  [4,16,1.1481,0,2.7717,0,0,3,0,0,2,0.7654,0,1.8478],
// 0 // Build by Primitive Generator 2
];
module ldraw_lib__1_4ring2(step=0, col=false, unit=2/5, alt=false, line=0.2, solid=!$preview)
    makepoly(ldraw_lib__1_4ring2(solid), step=step, col=col, unit=unit, alt=alt, line=line, solid=solid);
ldraw_lib__1_4ring2(line=0.2);
// file: ../p/1-4ndis.scad
use <../lib.scad>
function ldraw_lib__1_4ndis() = [
// 0 Disc Negative 0.25
// 0 Name: 1-4ndis.dat
// 0 Author: James Jessiman
// 0 !LDRAW_ORG Primitive UPDATE 2012-01
// 0 !LICENSE Licensed under CC BY 2.0 and CC BY 4.0 : see CAreadme.txt
// 
// 0 BFC CERTIFY CCW
  [0,"BFC","CERTIFY"],
  [0,"BFC","CCW"],
// 
// 0 !HISTORY 2002-03-23 [sbliss] Added BFC Statement
// 0 !HISTORY 2002-04-25 [PTadmin] Official Update 2002-02
// 0 !HISTORY 2007-06-22 [PTadmin] Header formatted for Contributor Agreement
// 0 !HISTORY 2008-07-01 [PTadmin] Official Update 2008-01
// 0 !HISTORY 2012-02-16 [Philo] Changed to CCW
// 0 !HISTORY 2012-03-30 [PTadmin] Official Update 2012-01
// 
// 
// 3 16 0.9239 0 0.3827 1 0 0 1 0 1
  [3,16,0.9239,0,0.3827,1,0,0,1,0,1],
// 3 16 0.7071 0 0.7071 0.9239 0 0.3827 1 0 1
  [3,16,0.7071,0,0.7071,0.9239,0,0.3827,1,0,1],
// 3 16 0.3827 0 0.9239 0.7071 0 0.7071 1 0 1
  [3,16,0.3827,0,0.9239,0.7071,0,0.7071,1,0,1],
// 3 16 0 0 1 0.3827 0 0.9239 1 0 1
  [3,16,0,0,1,0.3827,0,0.9239,1,0,1],
];
module ldraw_lib__1_4ndis(step=0, col=false, unit=2/5, alt=false, line=0.2, solid=!$preview)
    makepoly(ldraw_lib__1_4ndis(), step=step, col=col, unit=unit, alt=alt, line=line, solid=solid);
ldraw_lib__1_4ndis(line=0.2);
// file: ../p/1-4chrd.scad
use <../lib.scad>
$fa=1; $fs=0.2;
function ldraw_lib__1_4chrd(realsolid=false) = [
// 0 Chord 0.25
// 0 Name: 1-4chrd.dat
// 0 Author: Tony Hafner [hafhead]
// 0 !LDRAW_ORG Primitive UPDATE 2012-02
// 0 !LICENSE Licensed under CC BY 2.0 and CC BY 4.0 : see CAreadme.txt
// 
// 0 BFC CERTIFY CCW
  [0,"BFC","CERTIFY"],
  [0,"BFC","CCW"],
// 
// 0 !HISTORY 2004-04-22 [PTadmin] Official Update 2004-02
// 0 !HISTORY 2007-10-09 [PTadmin] Header formatted for Contributor Agreement
// 0 !HISTORY 2008-07-01 [PTadmin] Official Update 2008-01
// 0 !HISTORY 2012-08-02 [MMR1988] Re-creation with PrimGen2 and Rectifier
// 0 !HISTORY 2012-08-09 [PTadmin] Official Update 2012-02
// 
// 
// 4 16 0.9239 0 0.3827 0.3827 0 0.9239 0 0 1 1 0 0
  [4,16,0.9239,0,0.3827,0.3827,0,0.9239,0,0,1,1,0,0],
// 3 16 0.7071 0 0.7071 0.3827 0 0.9239 0.9239 0 0.3827
  [3,16,0.7071,0,0.7071,0.3827,0,0.9239,0.9239,0,0.3827],
];
module ldraw_lib__1_4chrd(step=0, col=false, unit=2/5, alt=false, line=0.2, solid=!$preview)
    makepoly(ldraw_lib__1_4chrd(solid), step=step, col=col, unit=unit, alt=alt, line=line, solid=solid);
ldraw_lib__1_4chrd(line=0.2);
// file: 3004.scad
use <../lib.scad>
use <s/3004s01.scad>
function ldraw_lib__3004() = [
// 0 Brick  1 x  2
// 0 Name: 3004.dat
// 0 Author: James Jessiman
// 0 !LDRAW_ORG Part UPDATE 2022-05
// 0 !LICENSE Licensed under CC BY 2.0 and CC BY 4.0 : see CAreadme.txt
// 
// 0 BFC CERTIFY CCW
  [0,"BFC","CERTIFY"],
  [0,"BFC","CCW"],
// 
// 0 !HISTORY 2001-10-26 [PTadmin] Official Update 2001-01
// 0 !HISTORY 2002-05-07 {unknown} BFC Certification
// 0 !HISTORY 2002-06-11 [PTadmin] Official Update 2002-03
// 0 !HISTORY 2007-05-07 [PTadmin] Header formatted for Contributor Agreement
// 0 !HISTORY 2008-07-01 [PTadmin] Official Update 2008-01
// 0 !HISTORY 2022-08-04 [MagFors] Using subfile
// 0 !HISTORY 2022-09-15 [PTadmin] Official Update 2022-05
// 
// 
// 1 16 0 0 0 1 0 0 0 1 0 0 0 1 s\3004s01.dat
  [1,16,0,0,0,1,0,0,0,1,0,0,0,1, ldraw_lib__s__3004s01()],
// 4 16 -20 24 -10 20 24 -10 20 0 -10 -20 0 -10
  [4,16,-20,24,-10,20,24,-10,20,0,-10,-20,0,-10],
];
module ldraw_lib__3004(step=0, col=false, unit=2/5, alt=false, line=0.2, solid=!$preview)
    makepoly(ldraw_lib__3004(), step=step, col=col, unit=unit, alt=alt, line=line, solid=solid);
ldraw_lib__3004(line=0.2);
// main file
use <../lib.scad>
use <163555j.scad>
use <3004.scad>
function ldraw_lib__3004d0x() = [
// 0 Brick  1 x  2 with Town Airport Direction Signs on White Background Left Sticker
// 0 Name: 3004d0x.dat
// 0 Author: Takeshi Takahashi [RainbowDolphin]
// 0 !LDRAW_ORG Shortcut UPDATE 2024-07
// 0 !LICENSE Licensed under CC BY 4.0 : see CAreadme.txt
// 
// 0 BFC CERTIFY CCW
  [0,"BFC","CERTIFY"],
  [0,"BFC","CCW"],
// 
// 0 !CATEGORY Sticker Shortcut
// 0 !KEYWORDS Airport Shuttle, Bricklink 3004pb017R, Monorail, set 6399, Station
// 
// 0 !HISTORY 2024-08-26 [OrionP] Official Update 2024-07
// 
// 1 16 0 0 0 1 0 0 0 1 0 0 0 1 3004.dat
  [1,16,0,0,0,1,0,0,0,1,0,0,0,1, ldraw_lib__3004()],
// 1 16 0 12 -10 1 0 0 0 0 -1 0 1 0 163555j.dat
  [1,16,0,12,-10,1,0,0,0,0,-1,0,1,0, ldraw_lib__163555j()],
];
module ldraw_lib__3004d0x(step=0, col=false, unit=2/5, alt=false, line=0.2, solid=!$preview)
    makepoly(ldraw_lib__3004d0x(), step=step, col=col, unit=unit, alt=alt, line=line, solid=solid);
ldraw_lib__3004d0x(line=0.2);
